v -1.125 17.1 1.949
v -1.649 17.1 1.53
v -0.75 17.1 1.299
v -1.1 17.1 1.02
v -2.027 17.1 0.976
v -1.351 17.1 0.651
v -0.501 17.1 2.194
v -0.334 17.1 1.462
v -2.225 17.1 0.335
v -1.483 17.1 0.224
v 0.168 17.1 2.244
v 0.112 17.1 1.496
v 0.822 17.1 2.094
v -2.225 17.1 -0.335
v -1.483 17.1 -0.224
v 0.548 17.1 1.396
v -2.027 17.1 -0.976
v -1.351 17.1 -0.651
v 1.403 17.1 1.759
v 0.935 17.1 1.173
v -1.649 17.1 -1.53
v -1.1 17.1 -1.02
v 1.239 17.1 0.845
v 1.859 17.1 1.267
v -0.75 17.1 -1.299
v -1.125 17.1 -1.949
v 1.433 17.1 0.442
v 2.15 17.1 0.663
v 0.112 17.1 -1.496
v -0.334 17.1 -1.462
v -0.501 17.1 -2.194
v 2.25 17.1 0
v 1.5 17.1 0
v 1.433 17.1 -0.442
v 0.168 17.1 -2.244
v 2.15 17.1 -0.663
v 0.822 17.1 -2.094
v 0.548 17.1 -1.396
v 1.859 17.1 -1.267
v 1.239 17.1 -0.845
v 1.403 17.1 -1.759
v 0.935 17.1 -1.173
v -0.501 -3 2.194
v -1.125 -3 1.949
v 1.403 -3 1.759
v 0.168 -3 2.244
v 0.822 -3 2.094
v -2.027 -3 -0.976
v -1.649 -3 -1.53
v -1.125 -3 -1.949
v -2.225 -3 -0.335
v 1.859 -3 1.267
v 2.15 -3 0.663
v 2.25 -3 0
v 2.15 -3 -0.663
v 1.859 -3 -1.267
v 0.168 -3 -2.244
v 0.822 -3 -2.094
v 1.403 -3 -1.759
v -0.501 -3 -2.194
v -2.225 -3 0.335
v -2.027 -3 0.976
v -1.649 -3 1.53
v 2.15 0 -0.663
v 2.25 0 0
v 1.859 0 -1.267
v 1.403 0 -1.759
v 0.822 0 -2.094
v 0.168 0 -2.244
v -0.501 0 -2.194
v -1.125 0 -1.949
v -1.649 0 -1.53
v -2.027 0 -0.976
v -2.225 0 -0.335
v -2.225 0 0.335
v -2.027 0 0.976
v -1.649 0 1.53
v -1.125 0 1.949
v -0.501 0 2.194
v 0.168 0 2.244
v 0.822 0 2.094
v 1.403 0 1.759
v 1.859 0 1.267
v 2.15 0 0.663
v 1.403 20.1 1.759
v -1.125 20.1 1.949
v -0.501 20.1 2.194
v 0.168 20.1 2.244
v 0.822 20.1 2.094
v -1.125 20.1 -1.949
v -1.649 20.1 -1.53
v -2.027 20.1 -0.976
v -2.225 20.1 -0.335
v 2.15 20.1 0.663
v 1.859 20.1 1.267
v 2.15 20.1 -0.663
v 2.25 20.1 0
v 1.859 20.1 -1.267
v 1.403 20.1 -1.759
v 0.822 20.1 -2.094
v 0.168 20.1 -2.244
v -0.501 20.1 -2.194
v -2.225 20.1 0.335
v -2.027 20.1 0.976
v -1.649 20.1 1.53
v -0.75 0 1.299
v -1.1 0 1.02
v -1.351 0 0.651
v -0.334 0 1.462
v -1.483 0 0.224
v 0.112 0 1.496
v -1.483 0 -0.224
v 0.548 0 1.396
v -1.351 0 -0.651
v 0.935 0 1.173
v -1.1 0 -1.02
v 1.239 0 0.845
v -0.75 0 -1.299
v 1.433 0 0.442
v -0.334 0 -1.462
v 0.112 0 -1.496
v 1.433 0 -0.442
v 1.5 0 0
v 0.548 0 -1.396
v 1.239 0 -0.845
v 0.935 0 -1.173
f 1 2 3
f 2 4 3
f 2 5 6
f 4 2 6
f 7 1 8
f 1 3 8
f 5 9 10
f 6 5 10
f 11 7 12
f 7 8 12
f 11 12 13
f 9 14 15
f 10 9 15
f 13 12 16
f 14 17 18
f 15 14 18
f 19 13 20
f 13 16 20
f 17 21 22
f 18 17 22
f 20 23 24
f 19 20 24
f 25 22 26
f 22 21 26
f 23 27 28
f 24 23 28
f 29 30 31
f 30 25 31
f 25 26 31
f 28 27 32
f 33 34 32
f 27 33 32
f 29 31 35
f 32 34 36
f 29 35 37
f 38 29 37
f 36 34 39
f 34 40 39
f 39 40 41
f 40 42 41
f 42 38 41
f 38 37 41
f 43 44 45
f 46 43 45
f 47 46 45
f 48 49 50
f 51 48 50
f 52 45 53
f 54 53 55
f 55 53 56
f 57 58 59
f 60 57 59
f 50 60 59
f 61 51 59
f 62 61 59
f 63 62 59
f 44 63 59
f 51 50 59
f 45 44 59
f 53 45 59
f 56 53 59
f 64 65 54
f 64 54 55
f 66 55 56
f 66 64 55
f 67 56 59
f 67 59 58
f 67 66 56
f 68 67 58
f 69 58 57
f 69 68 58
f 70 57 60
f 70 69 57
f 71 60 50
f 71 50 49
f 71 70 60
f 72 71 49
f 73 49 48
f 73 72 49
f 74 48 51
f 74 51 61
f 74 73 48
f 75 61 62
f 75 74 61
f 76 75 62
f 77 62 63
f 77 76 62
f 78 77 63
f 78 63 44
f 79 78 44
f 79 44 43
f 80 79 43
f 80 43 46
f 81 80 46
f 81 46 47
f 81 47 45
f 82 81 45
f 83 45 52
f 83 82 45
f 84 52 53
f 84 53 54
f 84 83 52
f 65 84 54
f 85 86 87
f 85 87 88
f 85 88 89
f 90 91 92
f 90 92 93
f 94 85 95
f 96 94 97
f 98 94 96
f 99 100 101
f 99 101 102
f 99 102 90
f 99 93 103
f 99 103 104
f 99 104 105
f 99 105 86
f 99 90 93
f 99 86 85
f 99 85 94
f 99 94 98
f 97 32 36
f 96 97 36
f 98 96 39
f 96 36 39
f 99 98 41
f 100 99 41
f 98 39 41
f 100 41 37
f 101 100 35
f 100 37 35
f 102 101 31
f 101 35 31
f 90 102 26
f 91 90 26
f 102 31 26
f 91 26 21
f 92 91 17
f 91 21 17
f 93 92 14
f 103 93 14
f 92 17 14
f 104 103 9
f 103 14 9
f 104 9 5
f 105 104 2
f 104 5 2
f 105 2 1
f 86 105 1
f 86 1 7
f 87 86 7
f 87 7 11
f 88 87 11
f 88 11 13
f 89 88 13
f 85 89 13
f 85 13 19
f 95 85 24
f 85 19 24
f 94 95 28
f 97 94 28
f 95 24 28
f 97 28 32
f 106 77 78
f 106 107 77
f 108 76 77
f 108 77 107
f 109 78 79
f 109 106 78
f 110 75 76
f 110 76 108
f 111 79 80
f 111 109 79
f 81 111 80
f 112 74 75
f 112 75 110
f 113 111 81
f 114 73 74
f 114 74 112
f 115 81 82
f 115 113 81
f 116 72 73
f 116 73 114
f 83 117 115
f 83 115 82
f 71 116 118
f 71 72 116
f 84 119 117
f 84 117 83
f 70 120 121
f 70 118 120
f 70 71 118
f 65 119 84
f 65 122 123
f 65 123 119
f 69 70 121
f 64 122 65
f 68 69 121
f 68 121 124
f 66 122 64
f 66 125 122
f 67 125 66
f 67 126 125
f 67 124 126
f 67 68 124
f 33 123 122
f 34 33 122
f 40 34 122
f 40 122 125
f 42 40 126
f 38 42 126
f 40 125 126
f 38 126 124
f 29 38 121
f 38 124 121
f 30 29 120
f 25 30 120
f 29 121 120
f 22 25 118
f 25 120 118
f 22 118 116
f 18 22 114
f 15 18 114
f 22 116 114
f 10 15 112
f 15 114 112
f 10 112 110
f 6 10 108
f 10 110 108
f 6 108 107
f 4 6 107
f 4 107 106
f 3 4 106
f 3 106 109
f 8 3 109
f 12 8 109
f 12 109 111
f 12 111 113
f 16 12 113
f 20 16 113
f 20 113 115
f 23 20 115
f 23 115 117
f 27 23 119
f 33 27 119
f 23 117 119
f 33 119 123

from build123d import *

# Parameters (mm, degrees)
SKETCH1_R           = 1.5
BOSS_EXTRUDE1_DEPTH = 17.1
SKETCH2_R           = 2.25
BOSS_EXTRUDE2_DEPTH = 3
BOSS_EXTRUDE3_START = -17.1
SKETCH2_2_R         = 2.25
BOSS_EXTRUDE3_DEPTH = 3


with BuildPart() as part:
    # Sketch1 → Boss-Extrude1 (new body)
    with BuildSketch(Plane(origin=(0, 0, 0), x_dir=(1, 0, 0), z_dir=(0, 1, 0))):
        Circle(SKETCH1_R)
    extrude(amount=BOSS_EXTRUDE1_DEPTH)

    # Sketch2 → Boss-Extrude2 (add)
    with BuildSketch(Plane(origin=(0, 17.1, 0), x_dir=(1, 0, 0), z_dir=(0, 1, 0))):
        Circle(SKETCH2_R)
    extrude(amount=BOSS_EXTRUDE2_DEPTH)

    # Sketch2<2> → Boss-Extrude3 (add)
    with BuildSketch(Plane(origin=(0, 17.1, 0), x_dir=(1, 0, 0), z_dir=(0, 1, 0)).offset(BOSS_EXTRUDE3_START)):
        Circle(SKETCH2_2_R)
    extrude(amount=-BOSS_EXTRUDE3_DEPTH)


solid = part.part
